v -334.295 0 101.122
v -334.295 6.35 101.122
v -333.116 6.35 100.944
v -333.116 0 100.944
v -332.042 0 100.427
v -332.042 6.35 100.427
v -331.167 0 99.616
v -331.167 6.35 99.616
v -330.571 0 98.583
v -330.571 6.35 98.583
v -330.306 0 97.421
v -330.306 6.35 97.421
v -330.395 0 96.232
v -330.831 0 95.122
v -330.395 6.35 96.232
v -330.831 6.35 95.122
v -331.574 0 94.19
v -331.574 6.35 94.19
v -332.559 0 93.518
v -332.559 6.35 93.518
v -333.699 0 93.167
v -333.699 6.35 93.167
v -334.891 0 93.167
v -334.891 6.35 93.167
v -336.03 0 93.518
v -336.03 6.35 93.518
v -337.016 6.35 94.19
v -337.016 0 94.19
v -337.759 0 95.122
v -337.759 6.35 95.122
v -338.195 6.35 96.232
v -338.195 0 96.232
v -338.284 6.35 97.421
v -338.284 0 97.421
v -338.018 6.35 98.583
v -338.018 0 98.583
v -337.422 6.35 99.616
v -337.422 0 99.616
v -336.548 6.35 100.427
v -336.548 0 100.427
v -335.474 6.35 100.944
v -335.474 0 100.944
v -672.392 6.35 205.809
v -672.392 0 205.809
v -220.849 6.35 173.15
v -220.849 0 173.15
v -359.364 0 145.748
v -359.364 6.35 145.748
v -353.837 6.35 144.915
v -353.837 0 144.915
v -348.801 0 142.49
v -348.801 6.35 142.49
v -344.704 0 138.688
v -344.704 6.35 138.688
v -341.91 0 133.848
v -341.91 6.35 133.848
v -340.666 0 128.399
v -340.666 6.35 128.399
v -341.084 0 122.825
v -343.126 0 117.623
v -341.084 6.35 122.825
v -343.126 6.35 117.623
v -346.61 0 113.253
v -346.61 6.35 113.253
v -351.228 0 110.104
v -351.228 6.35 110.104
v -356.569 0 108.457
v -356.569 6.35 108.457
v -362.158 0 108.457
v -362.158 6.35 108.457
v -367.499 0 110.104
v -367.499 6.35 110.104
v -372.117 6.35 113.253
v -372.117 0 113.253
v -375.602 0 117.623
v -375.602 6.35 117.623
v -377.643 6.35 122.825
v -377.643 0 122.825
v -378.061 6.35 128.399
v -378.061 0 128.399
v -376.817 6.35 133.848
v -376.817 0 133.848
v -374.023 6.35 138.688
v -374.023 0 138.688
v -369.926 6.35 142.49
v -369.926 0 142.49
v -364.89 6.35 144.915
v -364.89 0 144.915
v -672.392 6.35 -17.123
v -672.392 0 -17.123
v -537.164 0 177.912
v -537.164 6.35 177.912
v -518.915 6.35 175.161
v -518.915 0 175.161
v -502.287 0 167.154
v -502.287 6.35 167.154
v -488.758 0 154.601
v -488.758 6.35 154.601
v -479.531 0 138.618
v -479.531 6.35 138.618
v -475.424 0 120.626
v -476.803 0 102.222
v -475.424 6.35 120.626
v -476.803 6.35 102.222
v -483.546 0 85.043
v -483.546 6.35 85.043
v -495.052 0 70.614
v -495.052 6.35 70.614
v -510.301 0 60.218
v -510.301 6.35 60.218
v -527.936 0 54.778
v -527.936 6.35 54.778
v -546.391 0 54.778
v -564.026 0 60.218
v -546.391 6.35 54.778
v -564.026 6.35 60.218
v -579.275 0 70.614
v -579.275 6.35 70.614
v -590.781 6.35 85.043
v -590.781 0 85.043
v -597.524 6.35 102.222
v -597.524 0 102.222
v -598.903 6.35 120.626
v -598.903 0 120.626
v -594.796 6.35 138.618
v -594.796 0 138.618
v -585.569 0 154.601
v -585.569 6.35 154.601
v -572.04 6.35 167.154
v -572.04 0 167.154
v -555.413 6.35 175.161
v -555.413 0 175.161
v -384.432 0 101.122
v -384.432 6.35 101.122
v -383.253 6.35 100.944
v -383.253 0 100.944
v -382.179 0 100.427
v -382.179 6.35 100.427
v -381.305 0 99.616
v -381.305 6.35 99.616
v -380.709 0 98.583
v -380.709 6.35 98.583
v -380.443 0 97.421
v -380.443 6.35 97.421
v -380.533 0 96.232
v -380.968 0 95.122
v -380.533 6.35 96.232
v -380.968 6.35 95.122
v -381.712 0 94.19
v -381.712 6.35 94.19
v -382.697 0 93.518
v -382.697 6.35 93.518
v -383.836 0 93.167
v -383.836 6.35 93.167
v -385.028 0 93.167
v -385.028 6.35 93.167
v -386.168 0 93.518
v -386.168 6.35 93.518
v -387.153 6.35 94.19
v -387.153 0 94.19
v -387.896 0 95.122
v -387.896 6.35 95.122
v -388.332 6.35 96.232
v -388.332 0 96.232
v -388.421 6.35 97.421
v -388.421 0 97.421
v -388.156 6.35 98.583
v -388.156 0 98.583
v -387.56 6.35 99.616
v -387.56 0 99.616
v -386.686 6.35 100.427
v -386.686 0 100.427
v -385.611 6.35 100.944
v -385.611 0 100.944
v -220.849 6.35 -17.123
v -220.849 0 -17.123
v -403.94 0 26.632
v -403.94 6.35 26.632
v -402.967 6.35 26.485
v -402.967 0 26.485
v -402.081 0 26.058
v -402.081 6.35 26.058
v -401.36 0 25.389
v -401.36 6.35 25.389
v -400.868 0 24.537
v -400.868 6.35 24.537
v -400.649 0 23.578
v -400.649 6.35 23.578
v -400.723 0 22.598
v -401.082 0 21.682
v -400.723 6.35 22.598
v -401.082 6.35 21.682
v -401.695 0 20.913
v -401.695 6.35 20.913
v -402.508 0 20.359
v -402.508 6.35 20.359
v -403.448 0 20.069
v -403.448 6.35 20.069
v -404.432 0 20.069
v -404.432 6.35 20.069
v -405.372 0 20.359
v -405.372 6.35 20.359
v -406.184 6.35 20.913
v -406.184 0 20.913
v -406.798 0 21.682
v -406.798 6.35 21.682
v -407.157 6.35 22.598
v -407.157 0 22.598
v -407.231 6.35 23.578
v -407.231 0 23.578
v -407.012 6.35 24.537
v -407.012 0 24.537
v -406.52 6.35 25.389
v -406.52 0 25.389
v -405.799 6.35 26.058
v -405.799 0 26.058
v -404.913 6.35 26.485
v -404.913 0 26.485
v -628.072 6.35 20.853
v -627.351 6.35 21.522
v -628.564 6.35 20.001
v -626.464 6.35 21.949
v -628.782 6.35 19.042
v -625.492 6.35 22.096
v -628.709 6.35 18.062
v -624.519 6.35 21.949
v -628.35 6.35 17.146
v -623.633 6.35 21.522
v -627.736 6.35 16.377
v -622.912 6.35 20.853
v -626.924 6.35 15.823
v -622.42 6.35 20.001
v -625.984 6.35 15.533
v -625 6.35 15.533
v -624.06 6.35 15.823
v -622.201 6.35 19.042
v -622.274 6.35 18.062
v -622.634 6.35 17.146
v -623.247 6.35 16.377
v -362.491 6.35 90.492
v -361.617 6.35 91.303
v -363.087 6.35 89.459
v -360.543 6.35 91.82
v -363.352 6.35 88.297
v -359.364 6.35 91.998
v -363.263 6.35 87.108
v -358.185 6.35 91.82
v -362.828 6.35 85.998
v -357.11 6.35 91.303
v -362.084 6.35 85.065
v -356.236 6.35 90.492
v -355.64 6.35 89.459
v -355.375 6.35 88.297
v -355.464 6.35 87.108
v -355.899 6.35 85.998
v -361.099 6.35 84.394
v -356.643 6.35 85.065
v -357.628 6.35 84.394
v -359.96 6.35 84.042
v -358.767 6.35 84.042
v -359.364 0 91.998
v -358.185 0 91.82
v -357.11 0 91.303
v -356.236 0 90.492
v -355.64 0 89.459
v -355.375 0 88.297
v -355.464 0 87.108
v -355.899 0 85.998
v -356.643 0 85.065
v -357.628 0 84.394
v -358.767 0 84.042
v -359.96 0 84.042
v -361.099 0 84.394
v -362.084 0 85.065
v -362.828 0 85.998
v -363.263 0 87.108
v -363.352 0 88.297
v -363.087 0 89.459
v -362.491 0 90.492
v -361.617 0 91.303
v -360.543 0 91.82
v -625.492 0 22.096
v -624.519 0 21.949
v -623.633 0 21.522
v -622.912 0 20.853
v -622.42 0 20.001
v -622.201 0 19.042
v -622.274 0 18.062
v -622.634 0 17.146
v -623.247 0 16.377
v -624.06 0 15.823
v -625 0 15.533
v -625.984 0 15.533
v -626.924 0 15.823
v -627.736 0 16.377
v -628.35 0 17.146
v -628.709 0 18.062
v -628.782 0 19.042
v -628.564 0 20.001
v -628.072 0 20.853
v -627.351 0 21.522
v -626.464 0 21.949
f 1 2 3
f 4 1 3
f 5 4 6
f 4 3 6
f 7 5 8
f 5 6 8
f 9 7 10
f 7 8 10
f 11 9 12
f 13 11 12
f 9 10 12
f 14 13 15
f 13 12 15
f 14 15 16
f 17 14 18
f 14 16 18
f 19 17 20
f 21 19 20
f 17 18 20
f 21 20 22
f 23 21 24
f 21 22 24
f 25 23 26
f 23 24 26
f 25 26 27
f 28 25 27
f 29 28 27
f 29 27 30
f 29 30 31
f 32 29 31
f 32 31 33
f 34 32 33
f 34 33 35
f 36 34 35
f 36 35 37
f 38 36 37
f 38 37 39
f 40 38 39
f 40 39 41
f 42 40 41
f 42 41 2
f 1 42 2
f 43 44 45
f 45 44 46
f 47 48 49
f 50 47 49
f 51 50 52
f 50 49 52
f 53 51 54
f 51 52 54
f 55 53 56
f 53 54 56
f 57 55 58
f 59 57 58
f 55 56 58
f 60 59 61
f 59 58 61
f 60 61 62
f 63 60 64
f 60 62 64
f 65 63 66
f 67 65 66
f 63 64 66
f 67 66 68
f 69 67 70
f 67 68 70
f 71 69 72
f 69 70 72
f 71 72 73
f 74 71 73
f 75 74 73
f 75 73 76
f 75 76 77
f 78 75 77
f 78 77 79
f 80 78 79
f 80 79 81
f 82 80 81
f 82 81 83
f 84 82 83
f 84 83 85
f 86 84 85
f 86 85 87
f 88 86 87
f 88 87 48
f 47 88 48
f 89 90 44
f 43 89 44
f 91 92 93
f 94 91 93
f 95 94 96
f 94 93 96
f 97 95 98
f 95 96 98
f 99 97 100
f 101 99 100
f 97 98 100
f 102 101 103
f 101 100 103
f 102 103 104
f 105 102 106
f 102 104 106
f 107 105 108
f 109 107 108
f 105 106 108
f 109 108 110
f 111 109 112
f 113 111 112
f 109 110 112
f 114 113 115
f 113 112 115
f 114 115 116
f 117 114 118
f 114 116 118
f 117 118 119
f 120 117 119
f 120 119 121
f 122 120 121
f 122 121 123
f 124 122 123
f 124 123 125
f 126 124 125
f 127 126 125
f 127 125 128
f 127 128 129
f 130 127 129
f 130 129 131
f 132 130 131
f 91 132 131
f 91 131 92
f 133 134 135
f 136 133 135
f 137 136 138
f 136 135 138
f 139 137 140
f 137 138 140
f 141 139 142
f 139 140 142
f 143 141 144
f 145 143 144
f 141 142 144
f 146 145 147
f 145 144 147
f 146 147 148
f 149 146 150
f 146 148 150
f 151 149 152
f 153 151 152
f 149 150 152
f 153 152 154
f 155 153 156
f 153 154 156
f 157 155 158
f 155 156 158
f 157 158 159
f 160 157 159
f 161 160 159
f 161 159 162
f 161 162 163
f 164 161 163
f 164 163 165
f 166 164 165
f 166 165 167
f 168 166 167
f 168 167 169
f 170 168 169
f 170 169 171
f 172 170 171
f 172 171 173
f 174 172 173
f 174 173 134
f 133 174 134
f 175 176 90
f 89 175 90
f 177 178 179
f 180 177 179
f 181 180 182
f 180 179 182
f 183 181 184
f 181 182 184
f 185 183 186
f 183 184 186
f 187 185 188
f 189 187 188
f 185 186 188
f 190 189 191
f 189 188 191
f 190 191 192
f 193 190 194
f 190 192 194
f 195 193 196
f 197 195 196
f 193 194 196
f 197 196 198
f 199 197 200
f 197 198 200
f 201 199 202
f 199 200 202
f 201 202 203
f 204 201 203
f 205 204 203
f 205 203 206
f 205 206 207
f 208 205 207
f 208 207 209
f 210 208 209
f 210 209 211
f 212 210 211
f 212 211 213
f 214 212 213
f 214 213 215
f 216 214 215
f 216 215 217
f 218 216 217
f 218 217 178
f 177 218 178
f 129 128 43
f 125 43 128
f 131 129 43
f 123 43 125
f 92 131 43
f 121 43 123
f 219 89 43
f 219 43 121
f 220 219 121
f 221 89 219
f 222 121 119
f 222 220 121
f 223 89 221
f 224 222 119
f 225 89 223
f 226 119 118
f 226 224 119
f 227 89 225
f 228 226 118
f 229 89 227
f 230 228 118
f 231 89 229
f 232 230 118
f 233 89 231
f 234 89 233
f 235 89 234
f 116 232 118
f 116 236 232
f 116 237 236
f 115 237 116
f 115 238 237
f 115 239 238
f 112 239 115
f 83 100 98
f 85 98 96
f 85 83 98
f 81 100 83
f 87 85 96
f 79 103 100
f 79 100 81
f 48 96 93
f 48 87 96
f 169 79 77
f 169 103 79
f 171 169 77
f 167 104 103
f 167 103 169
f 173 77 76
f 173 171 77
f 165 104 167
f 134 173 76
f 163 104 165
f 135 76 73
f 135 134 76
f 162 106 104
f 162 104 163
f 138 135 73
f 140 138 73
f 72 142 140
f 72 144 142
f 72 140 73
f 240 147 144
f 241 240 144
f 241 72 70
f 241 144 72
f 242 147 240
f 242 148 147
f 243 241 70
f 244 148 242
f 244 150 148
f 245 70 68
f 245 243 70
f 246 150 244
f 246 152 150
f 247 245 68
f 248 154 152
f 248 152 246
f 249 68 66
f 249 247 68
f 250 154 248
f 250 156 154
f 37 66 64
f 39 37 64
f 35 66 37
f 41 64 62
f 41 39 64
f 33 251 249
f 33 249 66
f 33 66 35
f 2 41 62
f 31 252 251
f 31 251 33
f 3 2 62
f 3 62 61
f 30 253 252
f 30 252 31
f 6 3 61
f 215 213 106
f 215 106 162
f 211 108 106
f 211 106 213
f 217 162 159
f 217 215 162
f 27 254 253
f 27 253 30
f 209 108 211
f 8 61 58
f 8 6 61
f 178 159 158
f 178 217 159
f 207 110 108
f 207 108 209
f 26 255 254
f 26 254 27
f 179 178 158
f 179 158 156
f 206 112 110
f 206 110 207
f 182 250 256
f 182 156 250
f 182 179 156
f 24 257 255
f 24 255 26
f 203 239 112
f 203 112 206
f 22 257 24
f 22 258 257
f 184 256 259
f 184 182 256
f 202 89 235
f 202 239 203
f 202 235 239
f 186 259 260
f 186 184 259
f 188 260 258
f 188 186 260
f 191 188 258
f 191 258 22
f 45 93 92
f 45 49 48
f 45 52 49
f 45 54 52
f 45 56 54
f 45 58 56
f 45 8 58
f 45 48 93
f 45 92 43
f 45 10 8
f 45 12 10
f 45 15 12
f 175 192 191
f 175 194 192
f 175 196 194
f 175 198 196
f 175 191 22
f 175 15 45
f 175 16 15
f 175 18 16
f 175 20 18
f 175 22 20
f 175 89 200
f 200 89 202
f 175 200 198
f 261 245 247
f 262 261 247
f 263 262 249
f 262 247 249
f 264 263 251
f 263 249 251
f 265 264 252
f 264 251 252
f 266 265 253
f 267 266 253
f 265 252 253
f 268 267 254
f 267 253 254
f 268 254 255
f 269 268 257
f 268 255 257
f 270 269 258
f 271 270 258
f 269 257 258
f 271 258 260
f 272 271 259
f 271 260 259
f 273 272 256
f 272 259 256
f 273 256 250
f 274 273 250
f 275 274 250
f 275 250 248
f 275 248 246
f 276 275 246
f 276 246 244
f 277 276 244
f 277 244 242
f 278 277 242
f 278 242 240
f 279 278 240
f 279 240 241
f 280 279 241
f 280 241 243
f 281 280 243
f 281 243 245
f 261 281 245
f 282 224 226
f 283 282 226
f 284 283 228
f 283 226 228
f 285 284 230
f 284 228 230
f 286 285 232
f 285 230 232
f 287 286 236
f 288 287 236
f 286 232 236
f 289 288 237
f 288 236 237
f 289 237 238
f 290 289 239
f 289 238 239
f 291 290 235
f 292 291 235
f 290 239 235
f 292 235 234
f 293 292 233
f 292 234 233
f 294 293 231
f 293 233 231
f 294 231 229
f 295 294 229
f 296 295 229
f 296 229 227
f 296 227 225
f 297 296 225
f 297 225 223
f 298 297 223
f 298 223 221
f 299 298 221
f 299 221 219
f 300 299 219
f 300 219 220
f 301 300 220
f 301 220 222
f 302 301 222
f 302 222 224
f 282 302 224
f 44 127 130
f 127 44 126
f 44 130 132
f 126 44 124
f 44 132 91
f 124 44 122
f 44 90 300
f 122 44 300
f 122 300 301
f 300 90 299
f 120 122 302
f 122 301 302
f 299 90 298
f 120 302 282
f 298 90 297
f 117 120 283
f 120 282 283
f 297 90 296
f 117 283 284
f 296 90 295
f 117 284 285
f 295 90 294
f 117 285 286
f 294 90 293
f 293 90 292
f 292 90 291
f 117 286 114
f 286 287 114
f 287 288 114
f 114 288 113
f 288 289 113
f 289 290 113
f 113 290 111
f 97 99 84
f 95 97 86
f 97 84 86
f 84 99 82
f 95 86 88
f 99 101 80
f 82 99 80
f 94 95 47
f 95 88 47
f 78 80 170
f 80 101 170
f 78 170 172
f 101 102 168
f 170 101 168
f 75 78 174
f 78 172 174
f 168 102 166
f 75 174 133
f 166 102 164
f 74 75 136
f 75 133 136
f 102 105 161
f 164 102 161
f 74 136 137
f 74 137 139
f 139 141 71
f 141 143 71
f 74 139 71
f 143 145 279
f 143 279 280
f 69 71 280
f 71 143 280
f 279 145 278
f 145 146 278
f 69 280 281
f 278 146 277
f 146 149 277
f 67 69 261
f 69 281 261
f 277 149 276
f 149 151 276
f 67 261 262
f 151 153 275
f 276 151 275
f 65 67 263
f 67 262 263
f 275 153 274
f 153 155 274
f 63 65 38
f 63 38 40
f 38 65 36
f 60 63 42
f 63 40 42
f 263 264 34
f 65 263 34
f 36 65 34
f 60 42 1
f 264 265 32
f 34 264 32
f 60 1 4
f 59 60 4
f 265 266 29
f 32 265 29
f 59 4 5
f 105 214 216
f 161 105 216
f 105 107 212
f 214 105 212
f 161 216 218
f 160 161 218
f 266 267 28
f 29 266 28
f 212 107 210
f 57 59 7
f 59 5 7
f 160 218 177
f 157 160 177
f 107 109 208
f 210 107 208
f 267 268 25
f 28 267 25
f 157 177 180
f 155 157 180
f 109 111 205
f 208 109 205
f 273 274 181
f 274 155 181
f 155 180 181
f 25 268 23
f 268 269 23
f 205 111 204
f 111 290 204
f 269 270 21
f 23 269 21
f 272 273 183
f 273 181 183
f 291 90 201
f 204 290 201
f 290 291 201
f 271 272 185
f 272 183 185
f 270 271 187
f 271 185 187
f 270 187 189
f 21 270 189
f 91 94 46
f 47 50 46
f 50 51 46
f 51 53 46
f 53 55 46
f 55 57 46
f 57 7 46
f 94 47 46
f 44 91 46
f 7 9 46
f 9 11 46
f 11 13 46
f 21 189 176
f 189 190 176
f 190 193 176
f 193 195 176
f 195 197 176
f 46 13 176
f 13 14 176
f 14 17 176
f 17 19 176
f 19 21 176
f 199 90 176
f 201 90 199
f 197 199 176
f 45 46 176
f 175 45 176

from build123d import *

# Parameters (mm, degrees)
BOSS_EXTRUDE2_DEPTH = 6.35
SKETCH3_R           = 3.3
SKETCH3_R_2         = 4
SKETCH3_R_3         = 61.9125
SKETCH3_R_4         = 18.75
CUT_EXTRUDE1_DEPTH  = 704.212713409


with BuildPart() as part:
    # Sketch2 → Boss-Extrude2 (new body)
    with BuildSketch(Plane(origin=(0, 0, 0), x_dir=(1, 0, 0), z_dir=(0, 1, 0))):
        Polygon((-672.391731841, 17.123030998), (-672.391731841, -205.808543922), (-220.848796652, -173.149778169), (-220.848796652, 17.123030998), align=None)
    extrude(amount=BOSS_EXTRUDE2_DEPTH)

    # Sketch3 → Cut-Extrude1 (cut, through all)
    with BuildSketch(Plane(origin=(0, 6.35, 0), x_dir=(1, 0, 0), z_dir=(0, 1, 0))):
        with Locations(Location((-403.939830292, -23.331851988, 0), (0, 0, 270))):
            Circle(SKETCH3_R)
        with Locations(Location((-625.491718045, -18.795833368, 0), (0, 0, 270))):
            Circle(SKETCH3_R)
        with Locations(Location((-359.363535158, -87.997654624, 0), (0, 0, 270))):
            Circle(SKETCH3_R_2)
        with Locations(Location((-384.432251936, -97.121921342, 0), (0, 0, 270))):
            Circle(SKETCH3_R_2)
        with Locations(Location((-334.294818381, -97.121921342, 0), (0, 0, 270))):
            Circle(SKETCH3_R_2)
        with Locations(Location((-537.163535159, -115.999131996, 0), (0, 0, 270))):
            Circle(SKETCH3_R_3)
        with Locations(Location((-359.363535158, -126.997654624, 0), (0, 0, 270))):
            Circle(SKETCH3_R_4)
    extrude(amount=-CUT_EXTRUDE1_DEPTH, mode=Mode.SUBTRACT)


solid = part.part
